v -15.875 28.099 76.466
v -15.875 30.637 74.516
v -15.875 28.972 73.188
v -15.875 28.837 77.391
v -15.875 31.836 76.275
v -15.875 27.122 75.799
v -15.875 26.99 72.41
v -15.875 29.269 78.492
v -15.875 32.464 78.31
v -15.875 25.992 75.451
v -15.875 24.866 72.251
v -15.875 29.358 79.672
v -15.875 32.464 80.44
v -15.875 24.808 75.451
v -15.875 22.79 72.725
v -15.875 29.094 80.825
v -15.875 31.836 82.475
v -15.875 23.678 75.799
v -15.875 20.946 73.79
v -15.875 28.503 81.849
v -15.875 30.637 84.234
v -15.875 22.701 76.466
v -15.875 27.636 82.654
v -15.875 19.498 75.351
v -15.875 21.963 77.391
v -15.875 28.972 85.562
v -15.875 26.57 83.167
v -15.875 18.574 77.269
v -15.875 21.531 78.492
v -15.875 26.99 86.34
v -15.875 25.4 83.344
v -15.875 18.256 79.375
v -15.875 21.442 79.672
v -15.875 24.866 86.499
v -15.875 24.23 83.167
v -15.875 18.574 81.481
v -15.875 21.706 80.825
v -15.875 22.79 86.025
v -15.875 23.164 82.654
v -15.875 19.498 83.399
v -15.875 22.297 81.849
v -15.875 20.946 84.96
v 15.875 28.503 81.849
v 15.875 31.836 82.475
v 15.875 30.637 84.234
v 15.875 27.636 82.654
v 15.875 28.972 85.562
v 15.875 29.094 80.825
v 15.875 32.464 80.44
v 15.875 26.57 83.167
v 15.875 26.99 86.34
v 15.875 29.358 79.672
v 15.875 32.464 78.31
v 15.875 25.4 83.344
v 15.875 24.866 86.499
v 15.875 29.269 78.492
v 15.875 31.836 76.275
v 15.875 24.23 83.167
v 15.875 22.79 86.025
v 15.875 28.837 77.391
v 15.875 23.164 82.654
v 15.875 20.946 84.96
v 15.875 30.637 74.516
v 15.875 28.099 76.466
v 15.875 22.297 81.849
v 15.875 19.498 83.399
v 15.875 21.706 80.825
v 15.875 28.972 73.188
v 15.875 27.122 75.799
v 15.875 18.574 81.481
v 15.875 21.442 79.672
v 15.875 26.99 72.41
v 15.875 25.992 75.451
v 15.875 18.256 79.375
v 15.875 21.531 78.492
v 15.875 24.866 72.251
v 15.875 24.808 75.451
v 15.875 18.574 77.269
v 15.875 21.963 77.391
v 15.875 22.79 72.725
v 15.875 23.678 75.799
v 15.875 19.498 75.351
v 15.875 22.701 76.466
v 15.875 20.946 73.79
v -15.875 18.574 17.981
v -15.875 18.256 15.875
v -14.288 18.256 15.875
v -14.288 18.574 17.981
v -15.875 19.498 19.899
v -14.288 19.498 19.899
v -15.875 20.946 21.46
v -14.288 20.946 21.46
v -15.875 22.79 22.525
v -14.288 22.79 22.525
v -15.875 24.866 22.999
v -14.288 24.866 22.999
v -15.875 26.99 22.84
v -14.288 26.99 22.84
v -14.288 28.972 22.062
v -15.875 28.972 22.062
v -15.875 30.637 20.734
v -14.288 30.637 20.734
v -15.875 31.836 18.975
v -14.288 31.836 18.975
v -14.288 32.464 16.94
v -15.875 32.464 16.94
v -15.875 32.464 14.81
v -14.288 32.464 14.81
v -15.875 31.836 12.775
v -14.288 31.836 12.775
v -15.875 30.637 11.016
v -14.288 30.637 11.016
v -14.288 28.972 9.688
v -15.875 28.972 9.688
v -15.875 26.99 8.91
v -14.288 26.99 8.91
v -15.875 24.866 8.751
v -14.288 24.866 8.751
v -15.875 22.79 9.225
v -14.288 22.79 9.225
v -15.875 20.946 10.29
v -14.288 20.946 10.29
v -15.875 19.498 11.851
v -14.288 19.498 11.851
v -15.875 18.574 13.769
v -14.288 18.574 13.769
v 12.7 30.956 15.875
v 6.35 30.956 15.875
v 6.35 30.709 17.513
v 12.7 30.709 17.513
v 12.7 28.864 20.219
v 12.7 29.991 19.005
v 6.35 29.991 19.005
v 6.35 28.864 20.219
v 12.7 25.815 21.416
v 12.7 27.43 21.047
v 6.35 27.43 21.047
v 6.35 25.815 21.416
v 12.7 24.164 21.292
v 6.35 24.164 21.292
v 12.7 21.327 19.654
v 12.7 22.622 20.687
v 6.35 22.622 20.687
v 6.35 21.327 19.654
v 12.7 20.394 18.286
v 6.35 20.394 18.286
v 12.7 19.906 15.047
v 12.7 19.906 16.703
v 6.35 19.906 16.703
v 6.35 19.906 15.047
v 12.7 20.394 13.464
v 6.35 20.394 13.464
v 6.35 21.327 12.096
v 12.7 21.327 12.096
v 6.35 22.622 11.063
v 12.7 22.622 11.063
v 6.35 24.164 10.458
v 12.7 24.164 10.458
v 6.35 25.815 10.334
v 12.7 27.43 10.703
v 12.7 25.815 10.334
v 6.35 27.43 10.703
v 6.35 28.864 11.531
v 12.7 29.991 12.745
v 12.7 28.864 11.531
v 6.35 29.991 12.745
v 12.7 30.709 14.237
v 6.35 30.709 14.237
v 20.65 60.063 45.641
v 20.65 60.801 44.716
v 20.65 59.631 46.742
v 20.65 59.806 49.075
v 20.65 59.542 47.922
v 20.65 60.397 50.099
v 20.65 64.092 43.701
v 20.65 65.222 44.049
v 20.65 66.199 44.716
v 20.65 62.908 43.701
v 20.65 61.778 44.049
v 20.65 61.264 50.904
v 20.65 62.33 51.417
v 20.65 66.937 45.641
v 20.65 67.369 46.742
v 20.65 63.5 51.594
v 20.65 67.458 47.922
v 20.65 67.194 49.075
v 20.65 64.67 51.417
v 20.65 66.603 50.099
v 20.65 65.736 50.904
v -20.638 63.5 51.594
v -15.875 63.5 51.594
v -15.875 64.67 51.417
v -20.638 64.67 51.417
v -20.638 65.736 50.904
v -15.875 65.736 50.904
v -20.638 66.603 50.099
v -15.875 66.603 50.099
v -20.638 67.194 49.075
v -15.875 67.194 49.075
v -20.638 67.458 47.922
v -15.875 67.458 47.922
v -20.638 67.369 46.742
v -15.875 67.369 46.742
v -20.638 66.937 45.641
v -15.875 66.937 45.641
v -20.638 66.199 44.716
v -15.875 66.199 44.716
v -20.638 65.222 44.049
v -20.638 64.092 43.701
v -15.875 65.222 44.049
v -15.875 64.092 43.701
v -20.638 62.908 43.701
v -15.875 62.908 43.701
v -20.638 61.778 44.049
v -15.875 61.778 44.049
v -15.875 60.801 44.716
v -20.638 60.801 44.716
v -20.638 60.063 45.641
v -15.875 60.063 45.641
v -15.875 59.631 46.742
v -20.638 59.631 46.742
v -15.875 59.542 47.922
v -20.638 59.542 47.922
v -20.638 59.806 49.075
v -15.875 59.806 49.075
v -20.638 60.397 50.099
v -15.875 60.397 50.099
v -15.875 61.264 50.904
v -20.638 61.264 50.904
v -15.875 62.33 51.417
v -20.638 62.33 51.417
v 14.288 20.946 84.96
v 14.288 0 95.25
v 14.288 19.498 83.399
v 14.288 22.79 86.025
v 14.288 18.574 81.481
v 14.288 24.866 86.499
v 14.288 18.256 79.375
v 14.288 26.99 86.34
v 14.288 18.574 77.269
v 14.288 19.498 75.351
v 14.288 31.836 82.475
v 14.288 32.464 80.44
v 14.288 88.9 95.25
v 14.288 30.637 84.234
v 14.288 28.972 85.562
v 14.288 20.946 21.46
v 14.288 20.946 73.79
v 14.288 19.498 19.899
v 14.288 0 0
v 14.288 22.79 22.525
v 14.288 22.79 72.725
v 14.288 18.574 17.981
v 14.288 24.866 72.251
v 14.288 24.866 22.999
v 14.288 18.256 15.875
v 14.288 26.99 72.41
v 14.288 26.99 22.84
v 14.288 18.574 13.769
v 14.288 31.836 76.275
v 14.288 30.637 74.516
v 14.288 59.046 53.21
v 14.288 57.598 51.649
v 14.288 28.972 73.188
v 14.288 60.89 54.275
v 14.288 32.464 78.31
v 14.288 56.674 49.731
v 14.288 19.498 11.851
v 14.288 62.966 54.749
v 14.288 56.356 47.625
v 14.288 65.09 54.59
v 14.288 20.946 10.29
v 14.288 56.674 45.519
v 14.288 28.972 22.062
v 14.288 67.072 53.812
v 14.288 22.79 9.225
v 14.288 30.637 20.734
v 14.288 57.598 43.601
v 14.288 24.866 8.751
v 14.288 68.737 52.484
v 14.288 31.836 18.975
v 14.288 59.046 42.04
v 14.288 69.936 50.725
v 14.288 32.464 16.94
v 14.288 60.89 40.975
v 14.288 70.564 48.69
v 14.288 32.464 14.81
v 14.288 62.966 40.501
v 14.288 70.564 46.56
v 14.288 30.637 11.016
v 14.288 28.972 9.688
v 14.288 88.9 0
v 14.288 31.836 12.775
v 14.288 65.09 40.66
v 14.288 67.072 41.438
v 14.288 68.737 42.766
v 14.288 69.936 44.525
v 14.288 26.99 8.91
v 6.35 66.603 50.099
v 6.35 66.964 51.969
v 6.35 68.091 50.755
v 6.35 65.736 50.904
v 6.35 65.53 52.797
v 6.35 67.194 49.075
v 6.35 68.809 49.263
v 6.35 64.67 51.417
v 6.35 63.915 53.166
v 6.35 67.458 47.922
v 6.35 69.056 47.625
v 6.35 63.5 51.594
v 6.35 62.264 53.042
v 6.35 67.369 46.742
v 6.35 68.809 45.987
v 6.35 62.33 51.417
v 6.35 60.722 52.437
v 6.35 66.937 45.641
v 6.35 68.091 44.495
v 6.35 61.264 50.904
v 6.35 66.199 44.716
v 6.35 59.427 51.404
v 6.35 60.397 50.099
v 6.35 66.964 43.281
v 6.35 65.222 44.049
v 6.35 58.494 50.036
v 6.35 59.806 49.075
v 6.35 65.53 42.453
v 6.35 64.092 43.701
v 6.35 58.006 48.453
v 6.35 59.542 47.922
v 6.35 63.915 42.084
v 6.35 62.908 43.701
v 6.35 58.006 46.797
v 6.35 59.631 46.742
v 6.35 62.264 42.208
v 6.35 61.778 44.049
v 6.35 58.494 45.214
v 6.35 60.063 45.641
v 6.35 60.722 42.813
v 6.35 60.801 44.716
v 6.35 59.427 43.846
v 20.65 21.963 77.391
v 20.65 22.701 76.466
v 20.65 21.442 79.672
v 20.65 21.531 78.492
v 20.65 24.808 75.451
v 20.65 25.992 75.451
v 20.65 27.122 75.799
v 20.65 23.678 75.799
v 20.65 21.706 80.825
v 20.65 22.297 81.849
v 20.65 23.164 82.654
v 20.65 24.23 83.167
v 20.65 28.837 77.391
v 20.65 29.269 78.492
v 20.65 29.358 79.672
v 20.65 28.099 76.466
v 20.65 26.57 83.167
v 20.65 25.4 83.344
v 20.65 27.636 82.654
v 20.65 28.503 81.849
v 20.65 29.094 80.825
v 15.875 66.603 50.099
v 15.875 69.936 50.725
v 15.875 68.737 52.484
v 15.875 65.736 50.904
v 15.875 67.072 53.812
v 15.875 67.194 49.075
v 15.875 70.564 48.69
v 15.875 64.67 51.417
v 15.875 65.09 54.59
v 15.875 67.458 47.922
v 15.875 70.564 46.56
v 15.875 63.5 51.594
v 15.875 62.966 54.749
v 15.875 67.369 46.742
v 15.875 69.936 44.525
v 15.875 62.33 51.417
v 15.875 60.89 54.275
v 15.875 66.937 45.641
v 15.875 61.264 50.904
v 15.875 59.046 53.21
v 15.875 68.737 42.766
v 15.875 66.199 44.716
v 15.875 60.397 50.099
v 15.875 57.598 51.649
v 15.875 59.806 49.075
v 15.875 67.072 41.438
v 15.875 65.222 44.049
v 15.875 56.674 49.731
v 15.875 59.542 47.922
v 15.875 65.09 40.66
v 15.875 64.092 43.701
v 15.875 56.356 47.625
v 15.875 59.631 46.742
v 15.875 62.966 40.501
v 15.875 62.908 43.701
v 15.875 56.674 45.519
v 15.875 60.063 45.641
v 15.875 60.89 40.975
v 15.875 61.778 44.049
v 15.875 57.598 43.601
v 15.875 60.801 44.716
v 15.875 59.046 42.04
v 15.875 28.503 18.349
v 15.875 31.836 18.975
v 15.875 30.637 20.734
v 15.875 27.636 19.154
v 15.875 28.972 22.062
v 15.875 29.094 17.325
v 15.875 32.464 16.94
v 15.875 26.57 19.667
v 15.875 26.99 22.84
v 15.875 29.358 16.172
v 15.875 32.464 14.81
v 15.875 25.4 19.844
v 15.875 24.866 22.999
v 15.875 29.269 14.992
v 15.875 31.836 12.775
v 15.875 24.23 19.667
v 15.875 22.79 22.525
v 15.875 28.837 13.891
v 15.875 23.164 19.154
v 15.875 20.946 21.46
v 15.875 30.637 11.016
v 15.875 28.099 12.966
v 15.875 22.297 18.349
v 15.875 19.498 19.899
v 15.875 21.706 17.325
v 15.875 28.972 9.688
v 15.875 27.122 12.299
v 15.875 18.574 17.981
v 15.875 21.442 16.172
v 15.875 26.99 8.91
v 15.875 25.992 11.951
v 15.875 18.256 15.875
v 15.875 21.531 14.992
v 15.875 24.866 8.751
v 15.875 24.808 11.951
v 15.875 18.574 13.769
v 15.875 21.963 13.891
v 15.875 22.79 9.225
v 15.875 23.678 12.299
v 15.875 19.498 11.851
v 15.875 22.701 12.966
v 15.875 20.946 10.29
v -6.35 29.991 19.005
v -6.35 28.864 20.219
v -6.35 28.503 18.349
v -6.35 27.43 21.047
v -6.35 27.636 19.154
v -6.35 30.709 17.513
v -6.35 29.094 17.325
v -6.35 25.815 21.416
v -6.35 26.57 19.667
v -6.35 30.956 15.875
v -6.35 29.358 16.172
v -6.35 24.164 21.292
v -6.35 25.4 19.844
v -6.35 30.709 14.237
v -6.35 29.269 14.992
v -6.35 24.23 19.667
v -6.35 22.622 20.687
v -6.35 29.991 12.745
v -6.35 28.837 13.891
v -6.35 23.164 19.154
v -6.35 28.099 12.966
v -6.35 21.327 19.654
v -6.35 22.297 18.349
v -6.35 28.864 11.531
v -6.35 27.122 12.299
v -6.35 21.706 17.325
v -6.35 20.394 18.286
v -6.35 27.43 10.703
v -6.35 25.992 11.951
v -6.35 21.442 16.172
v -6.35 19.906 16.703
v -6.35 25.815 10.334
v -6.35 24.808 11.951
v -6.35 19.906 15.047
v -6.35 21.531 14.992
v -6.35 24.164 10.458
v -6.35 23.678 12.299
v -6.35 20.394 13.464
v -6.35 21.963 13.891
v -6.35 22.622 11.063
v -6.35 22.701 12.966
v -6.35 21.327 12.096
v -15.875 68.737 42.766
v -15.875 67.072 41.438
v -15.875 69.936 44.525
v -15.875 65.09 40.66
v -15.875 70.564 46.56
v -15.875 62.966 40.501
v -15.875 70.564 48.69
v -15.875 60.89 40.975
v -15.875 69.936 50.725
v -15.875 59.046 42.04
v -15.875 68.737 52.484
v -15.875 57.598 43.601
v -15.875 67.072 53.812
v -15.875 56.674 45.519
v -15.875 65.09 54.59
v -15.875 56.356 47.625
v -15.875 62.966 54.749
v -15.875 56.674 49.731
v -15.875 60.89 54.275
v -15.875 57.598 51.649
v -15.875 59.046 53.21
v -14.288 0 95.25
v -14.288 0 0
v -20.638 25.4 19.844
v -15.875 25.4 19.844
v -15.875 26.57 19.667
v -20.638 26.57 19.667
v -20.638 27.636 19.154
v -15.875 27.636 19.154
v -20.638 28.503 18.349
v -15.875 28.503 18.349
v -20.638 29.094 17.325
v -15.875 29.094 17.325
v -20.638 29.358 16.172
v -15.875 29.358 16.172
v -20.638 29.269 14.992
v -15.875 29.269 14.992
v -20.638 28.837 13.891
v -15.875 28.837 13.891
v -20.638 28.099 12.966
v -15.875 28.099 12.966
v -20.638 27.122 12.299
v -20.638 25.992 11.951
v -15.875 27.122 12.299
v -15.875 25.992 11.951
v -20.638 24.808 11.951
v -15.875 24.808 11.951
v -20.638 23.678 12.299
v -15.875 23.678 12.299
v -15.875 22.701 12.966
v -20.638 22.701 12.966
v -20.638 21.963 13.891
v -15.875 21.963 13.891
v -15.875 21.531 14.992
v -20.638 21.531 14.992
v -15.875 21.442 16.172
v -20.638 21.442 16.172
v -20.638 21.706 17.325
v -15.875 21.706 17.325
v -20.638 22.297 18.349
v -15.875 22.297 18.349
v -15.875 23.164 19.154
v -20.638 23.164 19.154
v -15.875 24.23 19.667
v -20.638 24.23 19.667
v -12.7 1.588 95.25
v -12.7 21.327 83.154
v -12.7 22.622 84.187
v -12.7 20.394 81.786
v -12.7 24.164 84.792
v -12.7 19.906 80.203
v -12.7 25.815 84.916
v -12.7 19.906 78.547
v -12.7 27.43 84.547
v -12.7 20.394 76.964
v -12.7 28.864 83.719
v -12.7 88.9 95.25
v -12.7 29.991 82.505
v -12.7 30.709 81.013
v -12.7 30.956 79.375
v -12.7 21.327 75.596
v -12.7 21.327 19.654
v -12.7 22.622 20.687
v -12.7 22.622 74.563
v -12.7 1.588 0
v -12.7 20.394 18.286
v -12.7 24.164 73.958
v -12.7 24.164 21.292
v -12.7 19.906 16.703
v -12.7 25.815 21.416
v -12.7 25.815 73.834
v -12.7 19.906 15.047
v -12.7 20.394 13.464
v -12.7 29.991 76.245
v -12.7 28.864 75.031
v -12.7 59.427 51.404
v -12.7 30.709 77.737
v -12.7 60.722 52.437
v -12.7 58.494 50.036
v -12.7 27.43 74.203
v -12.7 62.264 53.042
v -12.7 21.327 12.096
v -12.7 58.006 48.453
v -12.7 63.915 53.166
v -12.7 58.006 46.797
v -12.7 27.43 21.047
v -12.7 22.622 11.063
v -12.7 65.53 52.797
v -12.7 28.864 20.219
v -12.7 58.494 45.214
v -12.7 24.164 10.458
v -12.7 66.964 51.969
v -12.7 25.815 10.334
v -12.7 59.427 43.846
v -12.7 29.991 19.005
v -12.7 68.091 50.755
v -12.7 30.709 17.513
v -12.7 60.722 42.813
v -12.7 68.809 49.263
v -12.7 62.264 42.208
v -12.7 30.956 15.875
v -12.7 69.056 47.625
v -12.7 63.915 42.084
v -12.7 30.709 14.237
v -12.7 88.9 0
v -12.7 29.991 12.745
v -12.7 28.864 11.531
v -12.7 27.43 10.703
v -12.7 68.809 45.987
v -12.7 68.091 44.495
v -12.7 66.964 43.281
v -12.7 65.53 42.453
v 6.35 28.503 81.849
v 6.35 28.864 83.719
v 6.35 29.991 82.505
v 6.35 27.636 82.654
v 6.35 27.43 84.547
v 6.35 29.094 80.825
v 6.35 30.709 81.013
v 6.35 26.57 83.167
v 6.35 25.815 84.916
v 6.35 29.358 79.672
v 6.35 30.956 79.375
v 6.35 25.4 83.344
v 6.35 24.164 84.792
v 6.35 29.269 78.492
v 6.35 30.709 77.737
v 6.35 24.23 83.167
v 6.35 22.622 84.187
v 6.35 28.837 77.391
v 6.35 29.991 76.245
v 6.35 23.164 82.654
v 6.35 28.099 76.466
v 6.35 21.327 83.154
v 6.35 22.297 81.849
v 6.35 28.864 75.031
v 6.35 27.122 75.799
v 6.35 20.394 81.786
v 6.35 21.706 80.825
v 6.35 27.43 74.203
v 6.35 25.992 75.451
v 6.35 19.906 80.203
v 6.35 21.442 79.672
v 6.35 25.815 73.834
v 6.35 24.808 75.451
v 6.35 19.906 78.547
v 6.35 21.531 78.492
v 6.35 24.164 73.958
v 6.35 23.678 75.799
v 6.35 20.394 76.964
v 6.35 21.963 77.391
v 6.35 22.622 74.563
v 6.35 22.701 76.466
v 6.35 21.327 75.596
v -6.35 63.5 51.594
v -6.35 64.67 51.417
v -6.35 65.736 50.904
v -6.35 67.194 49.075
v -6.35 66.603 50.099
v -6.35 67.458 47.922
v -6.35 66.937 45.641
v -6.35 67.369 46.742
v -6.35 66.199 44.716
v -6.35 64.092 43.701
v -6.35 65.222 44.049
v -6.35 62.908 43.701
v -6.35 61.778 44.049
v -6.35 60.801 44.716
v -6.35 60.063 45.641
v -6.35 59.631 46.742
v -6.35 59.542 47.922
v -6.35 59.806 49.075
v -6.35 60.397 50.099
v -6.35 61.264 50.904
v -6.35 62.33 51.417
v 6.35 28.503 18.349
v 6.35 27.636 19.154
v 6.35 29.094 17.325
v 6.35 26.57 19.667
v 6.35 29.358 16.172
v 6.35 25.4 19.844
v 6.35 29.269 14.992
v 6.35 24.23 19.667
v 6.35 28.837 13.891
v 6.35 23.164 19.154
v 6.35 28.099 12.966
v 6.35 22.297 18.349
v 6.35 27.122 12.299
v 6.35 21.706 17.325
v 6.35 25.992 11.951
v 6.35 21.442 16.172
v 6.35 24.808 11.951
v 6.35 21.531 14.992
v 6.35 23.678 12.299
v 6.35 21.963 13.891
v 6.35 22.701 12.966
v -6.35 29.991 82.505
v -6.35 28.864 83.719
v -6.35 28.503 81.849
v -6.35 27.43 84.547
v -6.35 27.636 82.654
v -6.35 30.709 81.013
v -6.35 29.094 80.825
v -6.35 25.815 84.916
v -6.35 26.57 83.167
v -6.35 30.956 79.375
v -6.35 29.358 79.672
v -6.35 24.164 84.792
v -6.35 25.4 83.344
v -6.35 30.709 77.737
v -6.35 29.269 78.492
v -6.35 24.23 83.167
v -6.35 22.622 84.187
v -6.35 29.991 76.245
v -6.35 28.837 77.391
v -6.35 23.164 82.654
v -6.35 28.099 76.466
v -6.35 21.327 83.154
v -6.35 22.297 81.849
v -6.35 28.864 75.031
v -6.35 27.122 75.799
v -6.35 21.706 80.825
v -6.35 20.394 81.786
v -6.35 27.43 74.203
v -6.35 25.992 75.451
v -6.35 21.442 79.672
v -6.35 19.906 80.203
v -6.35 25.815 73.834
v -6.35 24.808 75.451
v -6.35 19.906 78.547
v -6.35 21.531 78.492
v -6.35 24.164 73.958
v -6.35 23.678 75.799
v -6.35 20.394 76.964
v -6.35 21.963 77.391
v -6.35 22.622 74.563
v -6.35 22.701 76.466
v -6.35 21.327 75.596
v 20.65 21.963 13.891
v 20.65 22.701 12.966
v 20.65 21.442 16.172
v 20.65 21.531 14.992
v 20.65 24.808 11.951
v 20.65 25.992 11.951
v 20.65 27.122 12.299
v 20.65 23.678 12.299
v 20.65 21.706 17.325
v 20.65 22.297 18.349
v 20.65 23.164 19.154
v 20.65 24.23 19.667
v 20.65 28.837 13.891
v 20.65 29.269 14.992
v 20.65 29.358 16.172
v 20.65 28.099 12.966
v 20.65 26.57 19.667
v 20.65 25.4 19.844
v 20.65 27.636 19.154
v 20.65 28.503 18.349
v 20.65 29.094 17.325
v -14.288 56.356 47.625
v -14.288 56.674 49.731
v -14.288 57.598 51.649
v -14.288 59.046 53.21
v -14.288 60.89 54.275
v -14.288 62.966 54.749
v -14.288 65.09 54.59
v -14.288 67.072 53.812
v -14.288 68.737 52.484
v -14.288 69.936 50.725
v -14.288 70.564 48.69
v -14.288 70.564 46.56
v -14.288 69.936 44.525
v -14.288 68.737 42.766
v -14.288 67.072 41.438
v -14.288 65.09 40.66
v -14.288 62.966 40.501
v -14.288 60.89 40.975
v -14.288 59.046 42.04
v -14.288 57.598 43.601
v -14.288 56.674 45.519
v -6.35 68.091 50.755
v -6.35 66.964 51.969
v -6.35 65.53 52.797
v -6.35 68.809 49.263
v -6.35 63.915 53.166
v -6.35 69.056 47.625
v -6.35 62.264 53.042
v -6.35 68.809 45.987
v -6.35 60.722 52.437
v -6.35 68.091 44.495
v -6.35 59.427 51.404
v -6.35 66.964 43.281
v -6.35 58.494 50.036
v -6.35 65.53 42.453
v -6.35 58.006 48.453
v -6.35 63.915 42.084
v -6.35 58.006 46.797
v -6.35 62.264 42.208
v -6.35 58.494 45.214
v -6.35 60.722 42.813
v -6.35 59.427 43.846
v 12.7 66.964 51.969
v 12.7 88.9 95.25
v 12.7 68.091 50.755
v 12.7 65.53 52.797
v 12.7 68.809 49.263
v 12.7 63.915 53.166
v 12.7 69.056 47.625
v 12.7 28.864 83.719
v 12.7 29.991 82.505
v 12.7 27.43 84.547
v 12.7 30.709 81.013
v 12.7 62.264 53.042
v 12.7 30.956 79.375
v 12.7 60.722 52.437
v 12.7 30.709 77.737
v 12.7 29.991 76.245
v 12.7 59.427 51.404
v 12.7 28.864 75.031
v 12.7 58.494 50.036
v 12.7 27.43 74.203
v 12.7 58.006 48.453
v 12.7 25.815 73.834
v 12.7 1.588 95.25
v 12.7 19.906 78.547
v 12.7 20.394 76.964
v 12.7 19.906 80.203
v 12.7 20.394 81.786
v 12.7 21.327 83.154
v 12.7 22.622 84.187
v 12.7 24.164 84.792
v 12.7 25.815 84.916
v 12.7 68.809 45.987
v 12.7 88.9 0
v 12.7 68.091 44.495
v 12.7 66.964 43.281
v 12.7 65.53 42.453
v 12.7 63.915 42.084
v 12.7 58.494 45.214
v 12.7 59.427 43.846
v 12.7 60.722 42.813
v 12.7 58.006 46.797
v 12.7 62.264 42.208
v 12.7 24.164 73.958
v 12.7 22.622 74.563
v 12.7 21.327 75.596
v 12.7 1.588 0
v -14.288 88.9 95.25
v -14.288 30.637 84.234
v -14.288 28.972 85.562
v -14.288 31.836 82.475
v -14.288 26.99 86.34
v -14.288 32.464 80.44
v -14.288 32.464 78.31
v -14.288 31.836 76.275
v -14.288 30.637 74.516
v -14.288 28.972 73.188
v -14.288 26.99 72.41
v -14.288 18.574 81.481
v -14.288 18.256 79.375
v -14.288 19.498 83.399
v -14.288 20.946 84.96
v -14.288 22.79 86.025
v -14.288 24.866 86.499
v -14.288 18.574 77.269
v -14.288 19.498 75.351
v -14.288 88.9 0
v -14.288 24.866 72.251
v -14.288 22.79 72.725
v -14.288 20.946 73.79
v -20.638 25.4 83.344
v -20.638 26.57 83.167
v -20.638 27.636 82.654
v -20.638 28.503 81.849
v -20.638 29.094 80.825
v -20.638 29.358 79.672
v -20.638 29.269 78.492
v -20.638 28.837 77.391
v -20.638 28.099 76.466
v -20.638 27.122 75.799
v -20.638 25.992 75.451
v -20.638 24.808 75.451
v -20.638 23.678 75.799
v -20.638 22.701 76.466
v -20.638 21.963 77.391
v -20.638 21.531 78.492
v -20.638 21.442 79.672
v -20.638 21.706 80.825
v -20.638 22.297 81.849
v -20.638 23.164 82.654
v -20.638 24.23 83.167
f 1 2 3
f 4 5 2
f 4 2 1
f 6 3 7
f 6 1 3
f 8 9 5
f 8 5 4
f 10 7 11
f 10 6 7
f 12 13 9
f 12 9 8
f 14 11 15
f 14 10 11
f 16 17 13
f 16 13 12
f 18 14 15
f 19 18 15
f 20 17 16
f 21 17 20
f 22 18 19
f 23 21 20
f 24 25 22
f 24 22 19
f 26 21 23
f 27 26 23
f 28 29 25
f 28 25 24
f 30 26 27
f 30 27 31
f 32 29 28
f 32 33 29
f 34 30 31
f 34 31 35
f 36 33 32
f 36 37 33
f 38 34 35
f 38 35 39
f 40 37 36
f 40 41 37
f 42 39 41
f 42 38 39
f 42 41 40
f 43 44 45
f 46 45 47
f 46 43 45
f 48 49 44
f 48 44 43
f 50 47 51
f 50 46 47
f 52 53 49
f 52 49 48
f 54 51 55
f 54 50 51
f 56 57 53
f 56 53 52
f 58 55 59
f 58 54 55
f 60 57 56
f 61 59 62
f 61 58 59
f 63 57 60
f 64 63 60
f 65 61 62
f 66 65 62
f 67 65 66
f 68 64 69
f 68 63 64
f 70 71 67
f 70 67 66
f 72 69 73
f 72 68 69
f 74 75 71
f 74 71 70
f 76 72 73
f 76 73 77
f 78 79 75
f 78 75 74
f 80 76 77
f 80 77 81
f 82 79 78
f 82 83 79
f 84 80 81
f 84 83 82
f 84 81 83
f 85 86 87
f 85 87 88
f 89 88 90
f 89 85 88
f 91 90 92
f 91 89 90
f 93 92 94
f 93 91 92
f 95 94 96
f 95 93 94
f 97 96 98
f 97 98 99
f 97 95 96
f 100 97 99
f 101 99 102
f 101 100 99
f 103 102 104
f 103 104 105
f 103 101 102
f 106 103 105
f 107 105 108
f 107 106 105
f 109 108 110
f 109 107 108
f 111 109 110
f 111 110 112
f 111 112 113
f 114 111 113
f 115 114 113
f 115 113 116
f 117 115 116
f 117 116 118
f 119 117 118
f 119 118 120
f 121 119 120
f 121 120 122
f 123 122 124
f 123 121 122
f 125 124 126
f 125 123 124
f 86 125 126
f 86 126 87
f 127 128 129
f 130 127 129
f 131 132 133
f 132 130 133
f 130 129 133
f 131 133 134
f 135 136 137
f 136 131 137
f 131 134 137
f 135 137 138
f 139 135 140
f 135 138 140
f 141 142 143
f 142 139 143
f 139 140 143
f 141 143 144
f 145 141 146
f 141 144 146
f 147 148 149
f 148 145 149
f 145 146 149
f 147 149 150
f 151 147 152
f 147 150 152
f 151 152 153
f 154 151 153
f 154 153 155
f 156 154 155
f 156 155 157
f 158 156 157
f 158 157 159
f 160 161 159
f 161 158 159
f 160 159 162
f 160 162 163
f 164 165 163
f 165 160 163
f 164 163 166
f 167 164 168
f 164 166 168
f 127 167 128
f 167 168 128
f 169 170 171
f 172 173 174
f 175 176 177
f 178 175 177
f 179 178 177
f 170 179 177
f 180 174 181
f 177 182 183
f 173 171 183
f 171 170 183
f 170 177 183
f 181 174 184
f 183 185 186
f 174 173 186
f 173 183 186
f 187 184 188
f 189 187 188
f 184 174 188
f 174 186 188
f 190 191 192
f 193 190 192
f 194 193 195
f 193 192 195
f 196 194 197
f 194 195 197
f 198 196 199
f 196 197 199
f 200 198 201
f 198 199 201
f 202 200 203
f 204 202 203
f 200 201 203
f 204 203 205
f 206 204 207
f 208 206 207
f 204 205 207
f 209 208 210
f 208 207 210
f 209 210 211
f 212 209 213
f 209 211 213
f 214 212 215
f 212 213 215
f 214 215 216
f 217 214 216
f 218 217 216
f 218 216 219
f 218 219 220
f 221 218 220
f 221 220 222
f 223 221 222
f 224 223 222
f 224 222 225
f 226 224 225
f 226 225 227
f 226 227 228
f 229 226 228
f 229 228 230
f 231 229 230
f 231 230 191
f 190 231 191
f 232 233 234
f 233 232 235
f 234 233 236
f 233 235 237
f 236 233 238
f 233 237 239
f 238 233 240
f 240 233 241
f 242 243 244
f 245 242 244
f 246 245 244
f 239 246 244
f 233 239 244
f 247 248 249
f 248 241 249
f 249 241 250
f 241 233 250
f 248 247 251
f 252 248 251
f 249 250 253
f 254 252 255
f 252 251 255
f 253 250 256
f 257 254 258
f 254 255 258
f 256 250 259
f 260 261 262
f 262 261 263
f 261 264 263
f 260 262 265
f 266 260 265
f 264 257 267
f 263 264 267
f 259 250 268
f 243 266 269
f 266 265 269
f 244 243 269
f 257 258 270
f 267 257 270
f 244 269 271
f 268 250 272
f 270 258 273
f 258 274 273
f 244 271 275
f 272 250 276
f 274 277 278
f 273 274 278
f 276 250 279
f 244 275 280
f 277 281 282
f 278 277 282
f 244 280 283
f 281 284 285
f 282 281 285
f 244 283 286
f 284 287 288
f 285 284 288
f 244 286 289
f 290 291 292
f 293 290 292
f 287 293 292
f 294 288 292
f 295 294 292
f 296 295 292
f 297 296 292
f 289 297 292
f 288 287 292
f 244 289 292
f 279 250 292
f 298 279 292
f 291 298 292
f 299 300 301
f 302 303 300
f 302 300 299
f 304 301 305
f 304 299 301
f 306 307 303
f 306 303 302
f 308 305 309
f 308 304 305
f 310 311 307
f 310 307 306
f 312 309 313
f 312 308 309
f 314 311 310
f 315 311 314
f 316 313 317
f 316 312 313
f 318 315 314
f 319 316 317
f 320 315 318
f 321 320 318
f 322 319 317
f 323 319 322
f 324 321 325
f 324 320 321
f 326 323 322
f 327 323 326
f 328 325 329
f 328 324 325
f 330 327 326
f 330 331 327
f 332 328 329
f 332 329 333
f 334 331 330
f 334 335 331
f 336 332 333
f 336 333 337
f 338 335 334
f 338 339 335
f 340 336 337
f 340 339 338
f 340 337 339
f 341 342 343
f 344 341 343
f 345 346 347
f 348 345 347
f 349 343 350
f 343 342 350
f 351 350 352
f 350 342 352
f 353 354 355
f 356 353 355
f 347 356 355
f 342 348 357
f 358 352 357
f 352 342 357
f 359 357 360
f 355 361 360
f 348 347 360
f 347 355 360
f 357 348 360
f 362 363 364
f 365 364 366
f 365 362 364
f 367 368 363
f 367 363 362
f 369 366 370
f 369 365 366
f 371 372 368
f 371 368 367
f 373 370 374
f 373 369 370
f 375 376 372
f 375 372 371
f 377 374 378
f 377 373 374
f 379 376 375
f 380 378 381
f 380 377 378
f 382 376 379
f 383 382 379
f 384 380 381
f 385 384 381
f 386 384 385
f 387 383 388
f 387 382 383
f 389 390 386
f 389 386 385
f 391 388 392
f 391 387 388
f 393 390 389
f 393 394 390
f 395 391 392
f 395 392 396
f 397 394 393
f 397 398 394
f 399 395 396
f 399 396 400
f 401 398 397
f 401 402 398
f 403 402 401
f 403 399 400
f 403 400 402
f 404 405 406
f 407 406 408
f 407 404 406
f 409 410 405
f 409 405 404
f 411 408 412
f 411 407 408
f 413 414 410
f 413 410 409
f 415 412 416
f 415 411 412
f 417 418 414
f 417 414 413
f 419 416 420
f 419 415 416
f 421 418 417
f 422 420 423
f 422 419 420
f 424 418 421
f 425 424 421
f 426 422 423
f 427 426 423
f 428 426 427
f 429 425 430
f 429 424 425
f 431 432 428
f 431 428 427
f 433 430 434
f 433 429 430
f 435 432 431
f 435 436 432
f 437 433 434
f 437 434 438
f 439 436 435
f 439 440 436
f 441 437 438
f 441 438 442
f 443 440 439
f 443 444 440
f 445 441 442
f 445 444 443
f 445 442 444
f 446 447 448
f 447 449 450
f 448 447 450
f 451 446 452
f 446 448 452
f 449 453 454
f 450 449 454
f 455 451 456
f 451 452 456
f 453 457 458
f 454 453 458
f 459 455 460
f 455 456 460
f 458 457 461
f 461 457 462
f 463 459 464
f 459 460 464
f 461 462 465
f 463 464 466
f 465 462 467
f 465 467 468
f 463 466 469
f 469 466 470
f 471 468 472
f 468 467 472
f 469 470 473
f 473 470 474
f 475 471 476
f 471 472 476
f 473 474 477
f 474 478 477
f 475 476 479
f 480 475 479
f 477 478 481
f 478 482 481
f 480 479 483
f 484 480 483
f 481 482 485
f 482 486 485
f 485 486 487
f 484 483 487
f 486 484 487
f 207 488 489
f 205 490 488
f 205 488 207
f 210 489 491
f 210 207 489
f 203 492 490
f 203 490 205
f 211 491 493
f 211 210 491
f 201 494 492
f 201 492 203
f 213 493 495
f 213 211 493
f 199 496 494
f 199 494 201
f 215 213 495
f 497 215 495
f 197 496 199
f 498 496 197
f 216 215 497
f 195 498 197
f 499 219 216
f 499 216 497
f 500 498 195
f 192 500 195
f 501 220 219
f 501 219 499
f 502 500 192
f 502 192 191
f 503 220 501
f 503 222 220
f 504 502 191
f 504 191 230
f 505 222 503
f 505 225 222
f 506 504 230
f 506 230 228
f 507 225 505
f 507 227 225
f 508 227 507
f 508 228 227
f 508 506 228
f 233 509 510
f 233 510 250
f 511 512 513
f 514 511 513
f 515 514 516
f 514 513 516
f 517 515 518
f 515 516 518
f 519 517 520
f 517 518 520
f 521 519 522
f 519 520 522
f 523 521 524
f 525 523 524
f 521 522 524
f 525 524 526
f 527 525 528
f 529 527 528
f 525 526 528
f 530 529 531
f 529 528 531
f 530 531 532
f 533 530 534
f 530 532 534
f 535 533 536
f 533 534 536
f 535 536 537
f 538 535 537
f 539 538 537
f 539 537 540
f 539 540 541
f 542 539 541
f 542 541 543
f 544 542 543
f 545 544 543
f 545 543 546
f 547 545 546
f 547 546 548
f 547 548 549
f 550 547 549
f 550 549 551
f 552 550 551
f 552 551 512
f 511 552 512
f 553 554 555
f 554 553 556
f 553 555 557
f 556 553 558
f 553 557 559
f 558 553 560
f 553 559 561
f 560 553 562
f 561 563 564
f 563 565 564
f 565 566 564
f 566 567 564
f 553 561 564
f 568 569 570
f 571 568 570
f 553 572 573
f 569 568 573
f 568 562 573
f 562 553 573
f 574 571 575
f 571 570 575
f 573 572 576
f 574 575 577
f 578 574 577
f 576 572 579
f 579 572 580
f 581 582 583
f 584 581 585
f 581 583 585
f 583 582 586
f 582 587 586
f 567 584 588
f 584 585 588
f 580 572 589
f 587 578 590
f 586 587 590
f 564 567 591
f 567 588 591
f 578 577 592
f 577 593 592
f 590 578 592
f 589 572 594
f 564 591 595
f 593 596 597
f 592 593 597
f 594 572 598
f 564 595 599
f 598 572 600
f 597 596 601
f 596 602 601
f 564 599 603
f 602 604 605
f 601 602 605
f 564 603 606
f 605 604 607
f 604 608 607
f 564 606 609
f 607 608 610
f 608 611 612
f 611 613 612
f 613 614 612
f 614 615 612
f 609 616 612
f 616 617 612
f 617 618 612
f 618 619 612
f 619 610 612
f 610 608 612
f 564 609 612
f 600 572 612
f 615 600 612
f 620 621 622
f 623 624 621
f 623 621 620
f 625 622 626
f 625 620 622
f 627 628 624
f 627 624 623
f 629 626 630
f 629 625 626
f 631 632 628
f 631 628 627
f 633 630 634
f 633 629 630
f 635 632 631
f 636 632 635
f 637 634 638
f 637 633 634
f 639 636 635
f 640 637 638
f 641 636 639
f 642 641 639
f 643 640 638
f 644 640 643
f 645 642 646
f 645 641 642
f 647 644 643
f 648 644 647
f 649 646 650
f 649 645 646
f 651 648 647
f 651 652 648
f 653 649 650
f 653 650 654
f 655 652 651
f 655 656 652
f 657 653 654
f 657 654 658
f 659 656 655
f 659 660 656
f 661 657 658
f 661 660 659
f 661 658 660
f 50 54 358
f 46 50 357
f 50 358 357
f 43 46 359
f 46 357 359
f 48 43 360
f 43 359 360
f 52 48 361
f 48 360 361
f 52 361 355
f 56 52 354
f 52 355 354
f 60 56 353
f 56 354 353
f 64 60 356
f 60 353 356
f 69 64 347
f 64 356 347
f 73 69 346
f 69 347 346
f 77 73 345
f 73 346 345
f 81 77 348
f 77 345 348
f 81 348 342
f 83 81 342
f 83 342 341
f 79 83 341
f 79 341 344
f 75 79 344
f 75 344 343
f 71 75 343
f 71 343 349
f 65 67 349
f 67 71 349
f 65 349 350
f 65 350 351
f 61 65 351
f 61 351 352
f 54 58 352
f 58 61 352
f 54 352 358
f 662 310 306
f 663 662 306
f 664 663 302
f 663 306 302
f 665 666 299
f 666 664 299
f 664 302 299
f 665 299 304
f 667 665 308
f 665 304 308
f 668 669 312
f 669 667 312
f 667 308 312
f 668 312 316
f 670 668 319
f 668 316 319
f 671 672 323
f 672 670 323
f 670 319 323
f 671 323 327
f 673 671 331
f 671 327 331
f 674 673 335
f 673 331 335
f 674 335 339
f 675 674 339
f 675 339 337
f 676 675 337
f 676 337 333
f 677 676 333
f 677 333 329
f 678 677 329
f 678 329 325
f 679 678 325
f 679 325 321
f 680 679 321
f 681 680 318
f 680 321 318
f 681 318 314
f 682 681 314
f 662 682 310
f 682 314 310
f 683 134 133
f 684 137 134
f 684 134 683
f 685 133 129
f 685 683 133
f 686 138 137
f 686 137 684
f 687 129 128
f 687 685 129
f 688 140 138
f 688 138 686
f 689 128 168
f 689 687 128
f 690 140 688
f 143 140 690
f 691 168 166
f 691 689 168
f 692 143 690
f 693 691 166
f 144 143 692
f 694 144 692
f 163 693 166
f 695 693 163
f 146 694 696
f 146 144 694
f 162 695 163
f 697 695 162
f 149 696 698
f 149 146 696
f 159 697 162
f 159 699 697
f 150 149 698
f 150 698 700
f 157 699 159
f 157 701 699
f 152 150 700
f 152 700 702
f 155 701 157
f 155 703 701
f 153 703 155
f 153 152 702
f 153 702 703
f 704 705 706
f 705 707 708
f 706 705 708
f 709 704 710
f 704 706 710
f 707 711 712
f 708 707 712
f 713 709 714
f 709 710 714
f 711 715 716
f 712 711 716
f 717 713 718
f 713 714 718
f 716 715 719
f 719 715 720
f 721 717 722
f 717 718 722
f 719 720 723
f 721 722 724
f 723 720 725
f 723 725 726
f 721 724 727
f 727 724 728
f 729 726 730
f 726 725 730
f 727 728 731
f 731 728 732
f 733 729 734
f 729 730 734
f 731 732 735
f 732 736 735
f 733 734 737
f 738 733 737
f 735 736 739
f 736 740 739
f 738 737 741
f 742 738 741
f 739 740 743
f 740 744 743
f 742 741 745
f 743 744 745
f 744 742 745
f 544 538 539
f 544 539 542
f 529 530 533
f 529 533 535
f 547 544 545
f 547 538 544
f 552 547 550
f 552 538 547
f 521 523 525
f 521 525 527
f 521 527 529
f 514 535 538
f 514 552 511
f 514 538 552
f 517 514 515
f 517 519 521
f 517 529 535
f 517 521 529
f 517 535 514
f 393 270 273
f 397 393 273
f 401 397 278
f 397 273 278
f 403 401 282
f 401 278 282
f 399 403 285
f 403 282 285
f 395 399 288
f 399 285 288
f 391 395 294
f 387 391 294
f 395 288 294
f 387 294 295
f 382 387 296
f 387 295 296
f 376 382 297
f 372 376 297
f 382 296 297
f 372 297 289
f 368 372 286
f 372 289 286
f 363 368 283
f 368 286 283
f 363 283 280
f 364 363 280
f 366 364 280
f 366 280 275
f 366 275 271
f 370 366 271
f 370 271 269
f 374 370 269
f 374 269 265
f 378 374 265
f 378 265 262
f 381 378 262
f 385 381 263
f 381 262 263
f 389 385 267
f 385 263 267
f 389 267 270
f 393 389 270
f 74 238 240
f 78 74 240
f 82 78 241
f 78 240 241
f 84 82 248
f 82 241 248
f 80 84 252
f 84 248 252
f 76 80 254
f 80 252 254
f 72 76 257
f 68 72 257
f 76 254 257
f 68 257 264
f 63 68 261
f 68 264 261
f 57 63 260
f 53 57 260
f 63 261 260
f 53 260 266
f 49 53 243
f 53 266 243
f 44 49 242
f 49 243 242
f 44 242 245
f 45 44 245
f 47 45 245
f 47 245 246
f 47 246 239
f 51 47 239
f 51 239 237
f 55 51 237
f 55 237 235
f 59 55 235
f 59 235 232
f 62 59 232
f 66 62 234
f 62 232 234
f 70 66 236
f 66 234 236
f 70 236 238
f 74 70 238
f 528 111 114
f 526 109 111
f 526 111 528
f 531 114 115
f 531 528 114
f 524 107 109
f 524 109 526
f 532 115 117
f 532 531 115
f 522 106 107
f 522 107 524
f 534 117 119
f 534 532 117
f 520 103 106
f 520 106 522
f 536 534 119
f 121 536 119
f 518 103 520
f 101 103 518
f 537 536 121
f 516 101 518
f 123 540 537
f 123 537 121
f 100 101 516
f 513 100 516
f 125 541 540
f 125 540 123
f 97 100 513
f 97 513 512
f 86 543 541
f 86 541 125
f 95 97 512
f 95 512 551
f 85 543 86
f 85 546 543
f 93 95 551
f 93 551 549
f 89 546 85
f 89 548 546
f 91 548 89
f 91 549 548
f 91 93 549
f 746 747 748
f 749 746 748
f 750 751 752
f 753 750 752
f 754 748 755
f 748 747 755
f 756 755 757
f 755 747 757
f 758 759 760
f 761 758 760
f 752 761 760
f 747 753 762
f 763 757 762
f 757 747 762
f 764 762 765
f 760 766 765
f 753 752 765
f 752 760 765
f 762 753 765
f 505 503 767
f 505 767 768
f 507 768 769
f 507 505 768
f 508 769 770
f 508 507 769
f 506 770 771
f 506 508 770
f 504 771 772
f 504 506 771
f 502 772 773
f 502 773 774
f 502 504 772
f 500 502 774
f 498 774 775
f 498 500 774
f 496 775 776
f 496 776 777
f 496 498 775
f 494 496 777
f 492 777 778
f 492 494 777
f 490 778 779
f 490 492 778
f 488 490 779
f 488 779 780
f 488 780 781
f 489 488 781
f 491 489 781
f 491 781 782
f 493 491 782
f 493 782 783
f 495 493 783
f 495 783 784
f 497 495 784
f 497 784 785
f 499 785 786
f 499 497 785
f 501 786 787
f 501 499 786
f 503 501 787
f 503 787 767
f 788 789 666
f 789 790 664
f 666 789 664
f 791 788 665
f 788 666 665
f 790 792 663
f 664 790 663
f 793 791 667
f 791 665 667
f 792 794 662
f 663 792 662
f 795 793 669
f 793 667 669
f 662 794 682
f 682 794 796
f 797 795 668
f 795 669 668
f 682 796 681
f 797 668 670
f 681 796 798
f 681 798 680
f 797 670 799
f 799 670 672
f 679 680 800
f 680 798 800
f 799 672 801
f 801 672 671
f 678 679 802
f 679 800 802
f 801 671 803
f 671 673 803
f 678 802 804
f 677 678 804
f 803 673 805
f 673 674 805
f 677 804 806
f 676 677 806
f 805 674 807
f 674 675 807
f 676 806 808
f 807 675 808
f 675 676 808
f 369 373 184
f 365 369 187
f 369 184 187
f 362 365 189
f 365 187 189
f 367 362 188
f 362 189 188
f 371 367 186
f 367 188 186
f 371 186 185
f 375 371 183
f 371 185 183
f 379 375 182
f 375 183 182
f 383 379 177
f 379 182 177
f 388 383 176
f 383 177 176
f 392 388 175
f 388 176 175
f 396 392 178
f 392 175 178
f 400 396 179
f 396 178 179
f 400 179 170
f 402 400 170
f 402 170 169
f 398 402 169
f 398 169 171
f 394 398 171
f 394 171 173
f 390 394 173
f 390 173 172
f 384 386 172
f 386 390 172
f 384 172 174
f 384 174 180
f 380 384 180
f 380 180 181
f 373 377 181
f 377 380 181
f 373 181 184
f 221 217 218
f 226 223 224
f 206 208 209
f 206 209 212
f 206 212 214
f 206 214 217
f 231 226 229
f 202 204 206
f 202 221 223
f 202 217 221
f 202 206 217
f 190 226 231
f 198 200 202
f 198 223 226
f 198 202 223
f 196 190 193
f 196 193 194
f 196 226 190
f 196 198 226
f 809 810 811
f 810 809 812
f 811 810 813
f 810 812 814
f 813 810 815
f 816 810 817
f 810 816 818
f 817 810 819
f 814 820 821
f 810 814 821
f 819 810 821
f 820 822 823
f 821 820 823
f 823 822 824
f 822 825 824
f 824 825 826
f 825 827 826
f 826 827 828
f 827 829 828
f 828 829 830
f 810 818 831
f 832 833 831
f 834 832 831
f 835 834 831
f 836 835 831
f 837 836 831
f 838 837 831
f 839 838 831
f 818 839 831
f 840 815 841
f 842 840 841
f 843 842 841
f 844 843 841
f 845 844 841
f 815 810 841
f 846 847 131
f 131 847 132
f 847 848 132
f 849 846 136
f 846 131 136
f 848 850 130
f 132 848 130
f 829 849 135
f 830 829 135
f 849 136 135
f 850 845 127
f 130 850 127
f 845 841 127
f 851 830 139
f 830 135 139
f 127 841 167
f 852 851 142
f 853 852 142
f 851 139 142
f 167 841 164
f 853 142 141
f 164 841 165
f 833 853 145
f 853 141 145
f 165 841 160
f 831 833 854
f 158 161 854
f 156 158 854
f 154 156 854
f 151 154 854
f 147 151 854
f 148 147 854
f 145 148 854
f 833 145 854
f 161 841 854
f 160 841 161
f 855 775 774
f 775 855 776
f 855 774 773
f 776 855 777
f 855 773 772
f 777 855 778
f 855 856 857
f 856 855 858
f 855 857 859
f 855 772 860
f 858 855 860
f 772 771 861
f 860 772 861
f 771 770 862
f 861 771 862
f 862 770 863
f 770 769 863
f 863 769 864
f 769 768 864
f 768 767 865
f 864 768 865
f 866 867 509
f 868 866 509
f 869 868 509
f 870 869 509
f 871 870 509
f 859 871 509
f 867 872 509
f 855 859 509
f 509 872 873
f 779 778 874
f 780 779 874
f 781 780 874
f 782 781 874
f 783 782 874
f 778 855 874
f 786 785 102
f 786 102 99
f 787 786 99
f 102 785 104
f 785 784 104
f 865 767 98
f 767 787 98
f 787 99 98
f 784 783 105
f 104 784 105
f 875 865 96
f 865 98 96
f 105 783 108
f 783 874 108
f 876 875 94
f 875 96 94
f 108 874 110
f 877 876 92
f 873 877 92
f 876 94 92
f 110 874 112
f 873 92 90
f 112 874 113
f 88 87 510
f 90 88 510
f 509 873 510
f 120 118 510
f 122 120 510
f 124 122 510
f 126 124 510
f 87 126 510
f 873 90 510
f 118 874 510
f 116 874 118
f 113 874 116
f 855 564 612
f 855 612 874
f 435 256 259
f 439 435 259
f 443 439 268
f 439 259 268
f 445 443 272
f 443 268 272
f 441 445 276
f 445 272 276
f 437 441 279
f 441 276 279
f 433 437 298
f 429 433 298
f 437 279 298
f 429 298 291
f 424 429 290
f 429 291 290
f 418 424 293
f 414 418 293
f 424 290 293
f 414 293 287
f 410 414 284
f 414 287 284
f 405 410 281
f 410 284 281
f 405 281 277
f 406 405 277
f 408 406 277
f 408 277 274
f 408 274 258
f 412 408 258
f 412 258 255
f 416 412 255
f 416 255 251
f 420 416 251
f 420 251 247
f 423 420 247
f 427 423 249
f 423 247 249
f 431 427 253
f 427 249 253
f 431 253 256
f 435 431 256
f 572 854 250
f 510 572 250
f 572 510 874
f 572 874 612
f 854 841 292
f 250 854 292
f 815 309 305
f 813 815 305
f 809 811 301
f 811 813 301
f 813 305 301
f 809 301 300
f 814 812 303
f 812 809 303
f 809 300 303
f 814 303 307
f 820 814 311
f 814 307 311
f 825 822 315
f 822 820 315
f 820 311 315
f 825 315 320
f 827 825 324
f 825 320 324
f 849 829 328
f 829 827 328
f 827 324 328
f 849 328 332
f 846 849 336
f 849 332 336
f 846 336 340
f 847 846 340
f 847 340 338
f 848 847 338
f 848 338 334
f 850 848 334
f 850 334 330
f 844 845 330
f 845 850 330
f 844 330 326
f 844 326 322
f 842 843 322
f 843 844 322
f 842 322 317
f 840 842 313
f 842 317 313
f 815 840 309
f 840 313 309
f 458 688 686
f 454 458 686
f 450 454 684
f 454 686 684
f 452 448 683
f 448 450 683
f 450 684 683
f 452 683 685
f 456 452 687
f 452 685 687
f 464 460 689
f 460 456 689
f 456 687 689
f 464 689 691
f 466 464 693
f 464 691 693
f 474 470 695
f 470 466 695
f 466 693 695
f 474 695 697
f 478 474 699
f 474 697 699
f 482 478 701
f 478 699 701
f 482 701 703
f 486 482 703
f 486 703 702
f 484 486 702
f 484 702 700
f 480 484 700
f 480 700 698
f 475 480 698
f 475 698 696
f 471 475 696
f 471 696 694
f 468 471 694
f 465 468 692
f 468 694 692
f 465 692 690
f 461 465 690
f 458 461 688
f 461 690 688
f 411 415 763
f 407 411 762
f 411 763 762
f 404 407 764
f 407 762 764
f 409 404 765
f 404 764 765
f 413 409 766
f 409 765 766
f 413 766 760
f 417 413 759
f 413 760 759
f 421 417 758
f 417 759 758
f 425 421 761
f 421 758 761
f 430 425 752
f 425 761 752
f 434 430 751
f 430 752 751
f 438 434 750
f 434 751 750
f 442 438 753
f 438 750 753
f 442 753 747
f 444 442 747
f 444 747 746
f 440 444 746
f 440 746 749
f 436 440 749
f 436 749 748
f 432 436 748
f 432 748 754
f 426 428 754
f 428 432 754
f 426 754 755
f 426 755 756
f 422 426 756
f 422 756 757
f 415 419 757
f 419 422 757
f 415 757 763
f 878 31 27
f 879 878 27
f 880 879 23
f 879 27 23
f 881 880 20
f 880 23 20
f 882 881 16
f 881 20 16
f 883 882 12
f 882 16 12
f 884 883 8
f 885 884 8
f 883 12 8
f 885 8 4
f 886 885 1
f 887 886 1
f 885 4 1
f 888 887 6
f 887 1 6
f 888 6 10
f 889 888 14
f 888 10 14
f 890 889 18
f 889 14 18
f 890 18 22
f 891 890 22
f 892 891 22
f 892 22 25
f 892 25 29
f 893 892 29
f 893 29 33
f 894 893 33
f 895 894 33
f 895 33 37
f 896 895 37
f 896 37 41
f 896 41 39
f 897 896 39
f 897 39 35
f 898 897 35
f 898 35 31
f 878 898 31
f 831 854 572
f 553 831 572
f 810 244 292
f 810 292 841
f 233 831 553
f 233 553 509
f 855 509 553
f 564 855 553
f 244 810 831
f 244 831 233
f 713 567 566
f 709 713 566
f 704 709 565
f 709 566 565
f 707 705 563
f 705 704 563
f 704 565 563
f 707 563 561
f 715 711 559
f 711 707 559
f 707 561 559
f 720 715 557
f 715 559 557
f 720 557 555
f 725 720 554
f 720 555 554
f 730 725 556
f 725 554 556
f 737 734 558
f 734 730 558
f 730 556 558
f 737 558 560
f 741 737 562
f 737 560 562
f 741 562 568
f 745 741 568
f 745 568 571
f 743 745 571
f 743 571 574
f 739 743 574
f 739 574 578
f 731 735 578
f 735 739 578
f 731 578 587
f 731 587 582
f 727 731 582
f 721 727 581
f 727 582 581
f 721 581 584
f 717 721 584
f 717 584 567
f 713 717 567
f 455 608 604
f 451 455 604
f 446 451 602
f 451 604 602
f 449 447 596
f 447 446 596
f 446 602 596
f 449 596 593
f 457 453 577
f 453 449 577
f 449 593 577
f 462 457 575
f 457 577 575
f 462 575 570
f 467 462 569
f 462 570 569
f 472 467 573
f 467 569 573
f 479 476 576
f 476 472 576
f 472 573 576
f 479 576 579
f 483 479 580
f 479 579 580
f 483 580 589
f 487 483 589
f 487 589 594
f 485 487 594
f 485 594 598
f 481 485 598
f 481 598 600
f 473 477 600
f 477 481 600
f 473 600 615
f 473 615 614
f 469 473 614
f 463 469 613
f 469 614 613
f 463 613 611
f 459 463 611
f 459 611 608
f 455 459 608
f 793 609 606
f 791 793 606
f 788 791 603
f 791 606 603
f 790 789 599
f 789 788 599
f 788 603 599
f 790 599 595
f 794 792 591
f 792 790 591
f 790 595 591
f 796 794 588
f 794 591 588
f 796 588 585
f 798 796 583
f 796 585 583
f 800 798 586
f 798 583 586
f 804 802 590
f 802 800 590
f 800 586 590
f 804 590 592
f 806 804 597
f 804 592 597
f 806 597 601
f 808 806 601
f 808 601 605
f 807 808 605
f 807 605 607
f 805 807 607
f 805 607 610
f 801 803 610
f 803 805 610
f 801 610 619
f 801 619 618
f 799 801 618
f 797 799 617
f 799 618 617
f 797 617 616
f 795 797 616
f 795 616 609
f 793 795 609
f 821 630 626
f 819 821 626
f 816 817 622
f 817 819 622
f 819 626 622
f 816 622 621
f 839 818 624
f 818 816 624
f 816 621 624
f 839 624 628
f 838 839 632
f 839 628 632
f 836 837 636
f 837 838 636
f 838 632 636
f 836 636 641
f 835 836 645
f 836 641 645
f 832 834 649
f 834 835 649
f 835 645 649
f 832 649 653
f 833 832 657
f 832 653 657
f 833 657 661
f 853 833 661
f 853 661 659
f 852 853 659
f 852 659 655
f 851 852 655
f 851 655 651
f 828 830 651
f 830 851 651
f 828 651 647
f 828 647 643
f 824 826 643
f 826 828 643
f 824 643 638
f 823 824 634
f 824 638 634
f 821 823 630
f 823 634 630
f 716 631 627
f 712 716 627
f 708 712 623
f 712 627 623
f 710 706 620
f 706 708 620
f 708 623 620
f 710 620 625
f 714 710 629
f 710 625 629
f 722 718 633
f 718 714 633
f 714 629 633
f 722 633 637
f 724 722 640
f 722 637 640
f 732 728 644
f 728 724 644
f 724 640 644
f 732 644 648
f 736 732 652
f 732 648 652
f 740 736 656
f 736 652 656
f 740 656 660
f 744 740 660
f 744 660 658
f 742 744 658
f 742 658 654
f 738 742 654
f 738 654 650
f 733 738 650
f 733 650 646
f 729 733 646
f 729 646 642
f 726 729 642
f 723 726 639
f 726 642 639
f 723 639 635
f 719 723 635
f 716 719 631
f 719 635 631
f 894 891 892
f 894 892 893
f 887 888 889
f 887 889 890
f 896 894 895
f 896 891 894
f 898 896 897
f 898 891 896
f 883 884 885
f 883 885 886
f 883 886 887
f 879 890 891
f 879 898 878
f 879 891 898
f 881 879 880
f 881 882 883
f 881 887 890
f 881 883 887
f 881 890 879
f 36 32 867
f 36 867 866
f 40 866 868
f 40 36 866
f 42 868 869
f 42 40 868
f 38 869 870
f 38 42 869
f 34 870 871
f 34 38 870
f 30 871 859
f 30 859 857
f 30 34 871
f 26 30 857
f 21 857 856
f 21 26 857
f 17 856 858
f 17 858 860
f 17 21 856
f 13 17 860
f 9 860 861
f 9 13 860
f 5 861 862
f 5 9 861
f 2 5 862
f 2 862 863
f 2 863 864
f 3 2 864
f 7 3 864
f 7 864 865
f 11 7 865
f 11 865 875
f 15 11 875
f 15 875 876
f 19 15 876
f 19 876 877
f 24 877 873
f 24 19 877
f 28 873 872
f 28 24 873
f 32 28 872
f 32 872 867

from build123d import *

# Parameters (mm, degrees)
BOSS_EXTRUDE1_DEPTH      = 95.25
BOSS_EXTRUDE2_DEPTH      = 1.5875
BOSS_EXTRUDE2_DEPTH_BACK = 30.1625
SKETCH3_R                = 5.55625
SKETCH4_R                = 7.14375
BOSS_EXTRUDE3_DEPTH      = 1.5875
BOSS_EXTRUDE4_START      = 1.5875
SKETCH5_R                = 7.14375
BOSS_EXTRUDE4_DEPTH      = 1.5875
SKETCH7_W                = 12.7
SKETCH7_H                = 95.25
CUT_EXTRUDE1_DEPTH       = 131.184679518
BOSS_EXTRUDE5_DEPTH      = 6.35
BOSS_EXTRUDE5_DEPTH_BACK = 34.9377
SKETCH6_R                = 3.96875


with BuildPart() as part:
    # Sketch1 → Boss-Extrude1 (new body)
    with BuildSketch(Plane.XY):
        Polygon((-14.2875, 88.9), (-14.2875, 0), (14.2875, 0), (14.2875, 88.9), (12.7, 88.9), (12.7, 1.5875), (-12.7, 1.5875), (-12.7, 88.9), align=None)
    extrude(amount=BOSS_EXTRUDE1_DEPTH)

    # Sketch3 → Boss-Extrude2 (add, two sides: drawn at the far end of the back side and taken through both)
    with BuildSketch(Plane(origin=(14.2875, 0, 0), x_dir=(0, 0, -1), z_dir=(1, 0, 0)).offset(-BOSS_EXTRUDE2_DEPTH_BACK)):
        with Locations(Location((-47.625, 63.5, 0), (0, 0, 90))):
            Circle(SKETCH3_R)
        with Locations(Location((-79.375, 25.4, 0), (0, 0, 90))):
            Circle(SKETCH3_R)
        with Locations(Location((-15.875, 25.4, 0), (0, 0, 90))):
            Circle(SKETCH3_R)
    extrude(amount=BOSS_EXTRUDE2_DEPTH + BOSS_EXTRUDE2_DEPTH_BACK)

    # Sketch4 → Boss-Extrude3 (add)
    with BuildSketch(Plane(origin=(14.2875, 0, 0), x_dir=(0, 0, -1), z_dir=(1, 0, 0))):
        with Locations(Location((-47.625, 63.5, 0), (0, 0, 270))):
            Circle(SKETCH4_R)
        with Locations(Location((-15.875, 25.4, 0), (0, 0, 270))):
            Circle(SKETCH4_R)
        with Locations(Location((-79.375, 25.4, 0), (0, 0, 270))):
            Circle(SKETCH4_R)
    extrude(amount=BOSS_EXTRUDE3_DEPTH)

    # Sketch5 → Boss-Extrude4 (add)
    with BuildSketch(Plane.ZY.offset(14.2875).offset(BOSS_EXTRUDE4_START)):
        with Locations(Location((47.625, 63.5, 0), (0, 0, 270))):
            Circle(SKETCH5_R)
        with Locations(Location((79.375, 25.4, 0), (0, 0, 270))):
            Circle(SKETCH5_R)
        with Locations(Location((15.875, 25.4, 0), (0, 0, 270))):
            Circle(SKETCH5_R)
    extrude(amount=-BOSS_EXTRUDE4_DEPTH)

    # Sketch7 → Cut-Extrude1 (cut, through all)
    with BuildSketch(Plane(origin=(0, 1.5875, 0), x_dir=(1, 0, 0), z_dir=(0, 1, 0))):
        with Locations((0, -47.625)):
            Rectangle(SKETCH7_W, SKETCH7_H)
    extrude(amount=CUT_EXTRUDE1_DEPTH, mode=Mode.SUBTRACT)

    # Sketch6 → Boss-Extrude5 (add, two sides: drawn at the far end of the back side and taken through both)
    with BuildSketch(Plane.ZY.offset(14.2875).offset(-BOSS_EXTRUDE5_DEPTH_BACK)):
        with Locations((47.625, 63.5)):
            Circle(SKETCH6_R)
        with Locations((79.375, 25.4)):
            Circle(SKETCH6_R)
        with Locations((15.875, 25.4)):
            Circle(SKETCH6_R)
    extrude(amount=BOSS_EXTRUDE5_DEPTH + BOSS_EXTRUDE5_DEPTH_BACK)


solid = part.part
